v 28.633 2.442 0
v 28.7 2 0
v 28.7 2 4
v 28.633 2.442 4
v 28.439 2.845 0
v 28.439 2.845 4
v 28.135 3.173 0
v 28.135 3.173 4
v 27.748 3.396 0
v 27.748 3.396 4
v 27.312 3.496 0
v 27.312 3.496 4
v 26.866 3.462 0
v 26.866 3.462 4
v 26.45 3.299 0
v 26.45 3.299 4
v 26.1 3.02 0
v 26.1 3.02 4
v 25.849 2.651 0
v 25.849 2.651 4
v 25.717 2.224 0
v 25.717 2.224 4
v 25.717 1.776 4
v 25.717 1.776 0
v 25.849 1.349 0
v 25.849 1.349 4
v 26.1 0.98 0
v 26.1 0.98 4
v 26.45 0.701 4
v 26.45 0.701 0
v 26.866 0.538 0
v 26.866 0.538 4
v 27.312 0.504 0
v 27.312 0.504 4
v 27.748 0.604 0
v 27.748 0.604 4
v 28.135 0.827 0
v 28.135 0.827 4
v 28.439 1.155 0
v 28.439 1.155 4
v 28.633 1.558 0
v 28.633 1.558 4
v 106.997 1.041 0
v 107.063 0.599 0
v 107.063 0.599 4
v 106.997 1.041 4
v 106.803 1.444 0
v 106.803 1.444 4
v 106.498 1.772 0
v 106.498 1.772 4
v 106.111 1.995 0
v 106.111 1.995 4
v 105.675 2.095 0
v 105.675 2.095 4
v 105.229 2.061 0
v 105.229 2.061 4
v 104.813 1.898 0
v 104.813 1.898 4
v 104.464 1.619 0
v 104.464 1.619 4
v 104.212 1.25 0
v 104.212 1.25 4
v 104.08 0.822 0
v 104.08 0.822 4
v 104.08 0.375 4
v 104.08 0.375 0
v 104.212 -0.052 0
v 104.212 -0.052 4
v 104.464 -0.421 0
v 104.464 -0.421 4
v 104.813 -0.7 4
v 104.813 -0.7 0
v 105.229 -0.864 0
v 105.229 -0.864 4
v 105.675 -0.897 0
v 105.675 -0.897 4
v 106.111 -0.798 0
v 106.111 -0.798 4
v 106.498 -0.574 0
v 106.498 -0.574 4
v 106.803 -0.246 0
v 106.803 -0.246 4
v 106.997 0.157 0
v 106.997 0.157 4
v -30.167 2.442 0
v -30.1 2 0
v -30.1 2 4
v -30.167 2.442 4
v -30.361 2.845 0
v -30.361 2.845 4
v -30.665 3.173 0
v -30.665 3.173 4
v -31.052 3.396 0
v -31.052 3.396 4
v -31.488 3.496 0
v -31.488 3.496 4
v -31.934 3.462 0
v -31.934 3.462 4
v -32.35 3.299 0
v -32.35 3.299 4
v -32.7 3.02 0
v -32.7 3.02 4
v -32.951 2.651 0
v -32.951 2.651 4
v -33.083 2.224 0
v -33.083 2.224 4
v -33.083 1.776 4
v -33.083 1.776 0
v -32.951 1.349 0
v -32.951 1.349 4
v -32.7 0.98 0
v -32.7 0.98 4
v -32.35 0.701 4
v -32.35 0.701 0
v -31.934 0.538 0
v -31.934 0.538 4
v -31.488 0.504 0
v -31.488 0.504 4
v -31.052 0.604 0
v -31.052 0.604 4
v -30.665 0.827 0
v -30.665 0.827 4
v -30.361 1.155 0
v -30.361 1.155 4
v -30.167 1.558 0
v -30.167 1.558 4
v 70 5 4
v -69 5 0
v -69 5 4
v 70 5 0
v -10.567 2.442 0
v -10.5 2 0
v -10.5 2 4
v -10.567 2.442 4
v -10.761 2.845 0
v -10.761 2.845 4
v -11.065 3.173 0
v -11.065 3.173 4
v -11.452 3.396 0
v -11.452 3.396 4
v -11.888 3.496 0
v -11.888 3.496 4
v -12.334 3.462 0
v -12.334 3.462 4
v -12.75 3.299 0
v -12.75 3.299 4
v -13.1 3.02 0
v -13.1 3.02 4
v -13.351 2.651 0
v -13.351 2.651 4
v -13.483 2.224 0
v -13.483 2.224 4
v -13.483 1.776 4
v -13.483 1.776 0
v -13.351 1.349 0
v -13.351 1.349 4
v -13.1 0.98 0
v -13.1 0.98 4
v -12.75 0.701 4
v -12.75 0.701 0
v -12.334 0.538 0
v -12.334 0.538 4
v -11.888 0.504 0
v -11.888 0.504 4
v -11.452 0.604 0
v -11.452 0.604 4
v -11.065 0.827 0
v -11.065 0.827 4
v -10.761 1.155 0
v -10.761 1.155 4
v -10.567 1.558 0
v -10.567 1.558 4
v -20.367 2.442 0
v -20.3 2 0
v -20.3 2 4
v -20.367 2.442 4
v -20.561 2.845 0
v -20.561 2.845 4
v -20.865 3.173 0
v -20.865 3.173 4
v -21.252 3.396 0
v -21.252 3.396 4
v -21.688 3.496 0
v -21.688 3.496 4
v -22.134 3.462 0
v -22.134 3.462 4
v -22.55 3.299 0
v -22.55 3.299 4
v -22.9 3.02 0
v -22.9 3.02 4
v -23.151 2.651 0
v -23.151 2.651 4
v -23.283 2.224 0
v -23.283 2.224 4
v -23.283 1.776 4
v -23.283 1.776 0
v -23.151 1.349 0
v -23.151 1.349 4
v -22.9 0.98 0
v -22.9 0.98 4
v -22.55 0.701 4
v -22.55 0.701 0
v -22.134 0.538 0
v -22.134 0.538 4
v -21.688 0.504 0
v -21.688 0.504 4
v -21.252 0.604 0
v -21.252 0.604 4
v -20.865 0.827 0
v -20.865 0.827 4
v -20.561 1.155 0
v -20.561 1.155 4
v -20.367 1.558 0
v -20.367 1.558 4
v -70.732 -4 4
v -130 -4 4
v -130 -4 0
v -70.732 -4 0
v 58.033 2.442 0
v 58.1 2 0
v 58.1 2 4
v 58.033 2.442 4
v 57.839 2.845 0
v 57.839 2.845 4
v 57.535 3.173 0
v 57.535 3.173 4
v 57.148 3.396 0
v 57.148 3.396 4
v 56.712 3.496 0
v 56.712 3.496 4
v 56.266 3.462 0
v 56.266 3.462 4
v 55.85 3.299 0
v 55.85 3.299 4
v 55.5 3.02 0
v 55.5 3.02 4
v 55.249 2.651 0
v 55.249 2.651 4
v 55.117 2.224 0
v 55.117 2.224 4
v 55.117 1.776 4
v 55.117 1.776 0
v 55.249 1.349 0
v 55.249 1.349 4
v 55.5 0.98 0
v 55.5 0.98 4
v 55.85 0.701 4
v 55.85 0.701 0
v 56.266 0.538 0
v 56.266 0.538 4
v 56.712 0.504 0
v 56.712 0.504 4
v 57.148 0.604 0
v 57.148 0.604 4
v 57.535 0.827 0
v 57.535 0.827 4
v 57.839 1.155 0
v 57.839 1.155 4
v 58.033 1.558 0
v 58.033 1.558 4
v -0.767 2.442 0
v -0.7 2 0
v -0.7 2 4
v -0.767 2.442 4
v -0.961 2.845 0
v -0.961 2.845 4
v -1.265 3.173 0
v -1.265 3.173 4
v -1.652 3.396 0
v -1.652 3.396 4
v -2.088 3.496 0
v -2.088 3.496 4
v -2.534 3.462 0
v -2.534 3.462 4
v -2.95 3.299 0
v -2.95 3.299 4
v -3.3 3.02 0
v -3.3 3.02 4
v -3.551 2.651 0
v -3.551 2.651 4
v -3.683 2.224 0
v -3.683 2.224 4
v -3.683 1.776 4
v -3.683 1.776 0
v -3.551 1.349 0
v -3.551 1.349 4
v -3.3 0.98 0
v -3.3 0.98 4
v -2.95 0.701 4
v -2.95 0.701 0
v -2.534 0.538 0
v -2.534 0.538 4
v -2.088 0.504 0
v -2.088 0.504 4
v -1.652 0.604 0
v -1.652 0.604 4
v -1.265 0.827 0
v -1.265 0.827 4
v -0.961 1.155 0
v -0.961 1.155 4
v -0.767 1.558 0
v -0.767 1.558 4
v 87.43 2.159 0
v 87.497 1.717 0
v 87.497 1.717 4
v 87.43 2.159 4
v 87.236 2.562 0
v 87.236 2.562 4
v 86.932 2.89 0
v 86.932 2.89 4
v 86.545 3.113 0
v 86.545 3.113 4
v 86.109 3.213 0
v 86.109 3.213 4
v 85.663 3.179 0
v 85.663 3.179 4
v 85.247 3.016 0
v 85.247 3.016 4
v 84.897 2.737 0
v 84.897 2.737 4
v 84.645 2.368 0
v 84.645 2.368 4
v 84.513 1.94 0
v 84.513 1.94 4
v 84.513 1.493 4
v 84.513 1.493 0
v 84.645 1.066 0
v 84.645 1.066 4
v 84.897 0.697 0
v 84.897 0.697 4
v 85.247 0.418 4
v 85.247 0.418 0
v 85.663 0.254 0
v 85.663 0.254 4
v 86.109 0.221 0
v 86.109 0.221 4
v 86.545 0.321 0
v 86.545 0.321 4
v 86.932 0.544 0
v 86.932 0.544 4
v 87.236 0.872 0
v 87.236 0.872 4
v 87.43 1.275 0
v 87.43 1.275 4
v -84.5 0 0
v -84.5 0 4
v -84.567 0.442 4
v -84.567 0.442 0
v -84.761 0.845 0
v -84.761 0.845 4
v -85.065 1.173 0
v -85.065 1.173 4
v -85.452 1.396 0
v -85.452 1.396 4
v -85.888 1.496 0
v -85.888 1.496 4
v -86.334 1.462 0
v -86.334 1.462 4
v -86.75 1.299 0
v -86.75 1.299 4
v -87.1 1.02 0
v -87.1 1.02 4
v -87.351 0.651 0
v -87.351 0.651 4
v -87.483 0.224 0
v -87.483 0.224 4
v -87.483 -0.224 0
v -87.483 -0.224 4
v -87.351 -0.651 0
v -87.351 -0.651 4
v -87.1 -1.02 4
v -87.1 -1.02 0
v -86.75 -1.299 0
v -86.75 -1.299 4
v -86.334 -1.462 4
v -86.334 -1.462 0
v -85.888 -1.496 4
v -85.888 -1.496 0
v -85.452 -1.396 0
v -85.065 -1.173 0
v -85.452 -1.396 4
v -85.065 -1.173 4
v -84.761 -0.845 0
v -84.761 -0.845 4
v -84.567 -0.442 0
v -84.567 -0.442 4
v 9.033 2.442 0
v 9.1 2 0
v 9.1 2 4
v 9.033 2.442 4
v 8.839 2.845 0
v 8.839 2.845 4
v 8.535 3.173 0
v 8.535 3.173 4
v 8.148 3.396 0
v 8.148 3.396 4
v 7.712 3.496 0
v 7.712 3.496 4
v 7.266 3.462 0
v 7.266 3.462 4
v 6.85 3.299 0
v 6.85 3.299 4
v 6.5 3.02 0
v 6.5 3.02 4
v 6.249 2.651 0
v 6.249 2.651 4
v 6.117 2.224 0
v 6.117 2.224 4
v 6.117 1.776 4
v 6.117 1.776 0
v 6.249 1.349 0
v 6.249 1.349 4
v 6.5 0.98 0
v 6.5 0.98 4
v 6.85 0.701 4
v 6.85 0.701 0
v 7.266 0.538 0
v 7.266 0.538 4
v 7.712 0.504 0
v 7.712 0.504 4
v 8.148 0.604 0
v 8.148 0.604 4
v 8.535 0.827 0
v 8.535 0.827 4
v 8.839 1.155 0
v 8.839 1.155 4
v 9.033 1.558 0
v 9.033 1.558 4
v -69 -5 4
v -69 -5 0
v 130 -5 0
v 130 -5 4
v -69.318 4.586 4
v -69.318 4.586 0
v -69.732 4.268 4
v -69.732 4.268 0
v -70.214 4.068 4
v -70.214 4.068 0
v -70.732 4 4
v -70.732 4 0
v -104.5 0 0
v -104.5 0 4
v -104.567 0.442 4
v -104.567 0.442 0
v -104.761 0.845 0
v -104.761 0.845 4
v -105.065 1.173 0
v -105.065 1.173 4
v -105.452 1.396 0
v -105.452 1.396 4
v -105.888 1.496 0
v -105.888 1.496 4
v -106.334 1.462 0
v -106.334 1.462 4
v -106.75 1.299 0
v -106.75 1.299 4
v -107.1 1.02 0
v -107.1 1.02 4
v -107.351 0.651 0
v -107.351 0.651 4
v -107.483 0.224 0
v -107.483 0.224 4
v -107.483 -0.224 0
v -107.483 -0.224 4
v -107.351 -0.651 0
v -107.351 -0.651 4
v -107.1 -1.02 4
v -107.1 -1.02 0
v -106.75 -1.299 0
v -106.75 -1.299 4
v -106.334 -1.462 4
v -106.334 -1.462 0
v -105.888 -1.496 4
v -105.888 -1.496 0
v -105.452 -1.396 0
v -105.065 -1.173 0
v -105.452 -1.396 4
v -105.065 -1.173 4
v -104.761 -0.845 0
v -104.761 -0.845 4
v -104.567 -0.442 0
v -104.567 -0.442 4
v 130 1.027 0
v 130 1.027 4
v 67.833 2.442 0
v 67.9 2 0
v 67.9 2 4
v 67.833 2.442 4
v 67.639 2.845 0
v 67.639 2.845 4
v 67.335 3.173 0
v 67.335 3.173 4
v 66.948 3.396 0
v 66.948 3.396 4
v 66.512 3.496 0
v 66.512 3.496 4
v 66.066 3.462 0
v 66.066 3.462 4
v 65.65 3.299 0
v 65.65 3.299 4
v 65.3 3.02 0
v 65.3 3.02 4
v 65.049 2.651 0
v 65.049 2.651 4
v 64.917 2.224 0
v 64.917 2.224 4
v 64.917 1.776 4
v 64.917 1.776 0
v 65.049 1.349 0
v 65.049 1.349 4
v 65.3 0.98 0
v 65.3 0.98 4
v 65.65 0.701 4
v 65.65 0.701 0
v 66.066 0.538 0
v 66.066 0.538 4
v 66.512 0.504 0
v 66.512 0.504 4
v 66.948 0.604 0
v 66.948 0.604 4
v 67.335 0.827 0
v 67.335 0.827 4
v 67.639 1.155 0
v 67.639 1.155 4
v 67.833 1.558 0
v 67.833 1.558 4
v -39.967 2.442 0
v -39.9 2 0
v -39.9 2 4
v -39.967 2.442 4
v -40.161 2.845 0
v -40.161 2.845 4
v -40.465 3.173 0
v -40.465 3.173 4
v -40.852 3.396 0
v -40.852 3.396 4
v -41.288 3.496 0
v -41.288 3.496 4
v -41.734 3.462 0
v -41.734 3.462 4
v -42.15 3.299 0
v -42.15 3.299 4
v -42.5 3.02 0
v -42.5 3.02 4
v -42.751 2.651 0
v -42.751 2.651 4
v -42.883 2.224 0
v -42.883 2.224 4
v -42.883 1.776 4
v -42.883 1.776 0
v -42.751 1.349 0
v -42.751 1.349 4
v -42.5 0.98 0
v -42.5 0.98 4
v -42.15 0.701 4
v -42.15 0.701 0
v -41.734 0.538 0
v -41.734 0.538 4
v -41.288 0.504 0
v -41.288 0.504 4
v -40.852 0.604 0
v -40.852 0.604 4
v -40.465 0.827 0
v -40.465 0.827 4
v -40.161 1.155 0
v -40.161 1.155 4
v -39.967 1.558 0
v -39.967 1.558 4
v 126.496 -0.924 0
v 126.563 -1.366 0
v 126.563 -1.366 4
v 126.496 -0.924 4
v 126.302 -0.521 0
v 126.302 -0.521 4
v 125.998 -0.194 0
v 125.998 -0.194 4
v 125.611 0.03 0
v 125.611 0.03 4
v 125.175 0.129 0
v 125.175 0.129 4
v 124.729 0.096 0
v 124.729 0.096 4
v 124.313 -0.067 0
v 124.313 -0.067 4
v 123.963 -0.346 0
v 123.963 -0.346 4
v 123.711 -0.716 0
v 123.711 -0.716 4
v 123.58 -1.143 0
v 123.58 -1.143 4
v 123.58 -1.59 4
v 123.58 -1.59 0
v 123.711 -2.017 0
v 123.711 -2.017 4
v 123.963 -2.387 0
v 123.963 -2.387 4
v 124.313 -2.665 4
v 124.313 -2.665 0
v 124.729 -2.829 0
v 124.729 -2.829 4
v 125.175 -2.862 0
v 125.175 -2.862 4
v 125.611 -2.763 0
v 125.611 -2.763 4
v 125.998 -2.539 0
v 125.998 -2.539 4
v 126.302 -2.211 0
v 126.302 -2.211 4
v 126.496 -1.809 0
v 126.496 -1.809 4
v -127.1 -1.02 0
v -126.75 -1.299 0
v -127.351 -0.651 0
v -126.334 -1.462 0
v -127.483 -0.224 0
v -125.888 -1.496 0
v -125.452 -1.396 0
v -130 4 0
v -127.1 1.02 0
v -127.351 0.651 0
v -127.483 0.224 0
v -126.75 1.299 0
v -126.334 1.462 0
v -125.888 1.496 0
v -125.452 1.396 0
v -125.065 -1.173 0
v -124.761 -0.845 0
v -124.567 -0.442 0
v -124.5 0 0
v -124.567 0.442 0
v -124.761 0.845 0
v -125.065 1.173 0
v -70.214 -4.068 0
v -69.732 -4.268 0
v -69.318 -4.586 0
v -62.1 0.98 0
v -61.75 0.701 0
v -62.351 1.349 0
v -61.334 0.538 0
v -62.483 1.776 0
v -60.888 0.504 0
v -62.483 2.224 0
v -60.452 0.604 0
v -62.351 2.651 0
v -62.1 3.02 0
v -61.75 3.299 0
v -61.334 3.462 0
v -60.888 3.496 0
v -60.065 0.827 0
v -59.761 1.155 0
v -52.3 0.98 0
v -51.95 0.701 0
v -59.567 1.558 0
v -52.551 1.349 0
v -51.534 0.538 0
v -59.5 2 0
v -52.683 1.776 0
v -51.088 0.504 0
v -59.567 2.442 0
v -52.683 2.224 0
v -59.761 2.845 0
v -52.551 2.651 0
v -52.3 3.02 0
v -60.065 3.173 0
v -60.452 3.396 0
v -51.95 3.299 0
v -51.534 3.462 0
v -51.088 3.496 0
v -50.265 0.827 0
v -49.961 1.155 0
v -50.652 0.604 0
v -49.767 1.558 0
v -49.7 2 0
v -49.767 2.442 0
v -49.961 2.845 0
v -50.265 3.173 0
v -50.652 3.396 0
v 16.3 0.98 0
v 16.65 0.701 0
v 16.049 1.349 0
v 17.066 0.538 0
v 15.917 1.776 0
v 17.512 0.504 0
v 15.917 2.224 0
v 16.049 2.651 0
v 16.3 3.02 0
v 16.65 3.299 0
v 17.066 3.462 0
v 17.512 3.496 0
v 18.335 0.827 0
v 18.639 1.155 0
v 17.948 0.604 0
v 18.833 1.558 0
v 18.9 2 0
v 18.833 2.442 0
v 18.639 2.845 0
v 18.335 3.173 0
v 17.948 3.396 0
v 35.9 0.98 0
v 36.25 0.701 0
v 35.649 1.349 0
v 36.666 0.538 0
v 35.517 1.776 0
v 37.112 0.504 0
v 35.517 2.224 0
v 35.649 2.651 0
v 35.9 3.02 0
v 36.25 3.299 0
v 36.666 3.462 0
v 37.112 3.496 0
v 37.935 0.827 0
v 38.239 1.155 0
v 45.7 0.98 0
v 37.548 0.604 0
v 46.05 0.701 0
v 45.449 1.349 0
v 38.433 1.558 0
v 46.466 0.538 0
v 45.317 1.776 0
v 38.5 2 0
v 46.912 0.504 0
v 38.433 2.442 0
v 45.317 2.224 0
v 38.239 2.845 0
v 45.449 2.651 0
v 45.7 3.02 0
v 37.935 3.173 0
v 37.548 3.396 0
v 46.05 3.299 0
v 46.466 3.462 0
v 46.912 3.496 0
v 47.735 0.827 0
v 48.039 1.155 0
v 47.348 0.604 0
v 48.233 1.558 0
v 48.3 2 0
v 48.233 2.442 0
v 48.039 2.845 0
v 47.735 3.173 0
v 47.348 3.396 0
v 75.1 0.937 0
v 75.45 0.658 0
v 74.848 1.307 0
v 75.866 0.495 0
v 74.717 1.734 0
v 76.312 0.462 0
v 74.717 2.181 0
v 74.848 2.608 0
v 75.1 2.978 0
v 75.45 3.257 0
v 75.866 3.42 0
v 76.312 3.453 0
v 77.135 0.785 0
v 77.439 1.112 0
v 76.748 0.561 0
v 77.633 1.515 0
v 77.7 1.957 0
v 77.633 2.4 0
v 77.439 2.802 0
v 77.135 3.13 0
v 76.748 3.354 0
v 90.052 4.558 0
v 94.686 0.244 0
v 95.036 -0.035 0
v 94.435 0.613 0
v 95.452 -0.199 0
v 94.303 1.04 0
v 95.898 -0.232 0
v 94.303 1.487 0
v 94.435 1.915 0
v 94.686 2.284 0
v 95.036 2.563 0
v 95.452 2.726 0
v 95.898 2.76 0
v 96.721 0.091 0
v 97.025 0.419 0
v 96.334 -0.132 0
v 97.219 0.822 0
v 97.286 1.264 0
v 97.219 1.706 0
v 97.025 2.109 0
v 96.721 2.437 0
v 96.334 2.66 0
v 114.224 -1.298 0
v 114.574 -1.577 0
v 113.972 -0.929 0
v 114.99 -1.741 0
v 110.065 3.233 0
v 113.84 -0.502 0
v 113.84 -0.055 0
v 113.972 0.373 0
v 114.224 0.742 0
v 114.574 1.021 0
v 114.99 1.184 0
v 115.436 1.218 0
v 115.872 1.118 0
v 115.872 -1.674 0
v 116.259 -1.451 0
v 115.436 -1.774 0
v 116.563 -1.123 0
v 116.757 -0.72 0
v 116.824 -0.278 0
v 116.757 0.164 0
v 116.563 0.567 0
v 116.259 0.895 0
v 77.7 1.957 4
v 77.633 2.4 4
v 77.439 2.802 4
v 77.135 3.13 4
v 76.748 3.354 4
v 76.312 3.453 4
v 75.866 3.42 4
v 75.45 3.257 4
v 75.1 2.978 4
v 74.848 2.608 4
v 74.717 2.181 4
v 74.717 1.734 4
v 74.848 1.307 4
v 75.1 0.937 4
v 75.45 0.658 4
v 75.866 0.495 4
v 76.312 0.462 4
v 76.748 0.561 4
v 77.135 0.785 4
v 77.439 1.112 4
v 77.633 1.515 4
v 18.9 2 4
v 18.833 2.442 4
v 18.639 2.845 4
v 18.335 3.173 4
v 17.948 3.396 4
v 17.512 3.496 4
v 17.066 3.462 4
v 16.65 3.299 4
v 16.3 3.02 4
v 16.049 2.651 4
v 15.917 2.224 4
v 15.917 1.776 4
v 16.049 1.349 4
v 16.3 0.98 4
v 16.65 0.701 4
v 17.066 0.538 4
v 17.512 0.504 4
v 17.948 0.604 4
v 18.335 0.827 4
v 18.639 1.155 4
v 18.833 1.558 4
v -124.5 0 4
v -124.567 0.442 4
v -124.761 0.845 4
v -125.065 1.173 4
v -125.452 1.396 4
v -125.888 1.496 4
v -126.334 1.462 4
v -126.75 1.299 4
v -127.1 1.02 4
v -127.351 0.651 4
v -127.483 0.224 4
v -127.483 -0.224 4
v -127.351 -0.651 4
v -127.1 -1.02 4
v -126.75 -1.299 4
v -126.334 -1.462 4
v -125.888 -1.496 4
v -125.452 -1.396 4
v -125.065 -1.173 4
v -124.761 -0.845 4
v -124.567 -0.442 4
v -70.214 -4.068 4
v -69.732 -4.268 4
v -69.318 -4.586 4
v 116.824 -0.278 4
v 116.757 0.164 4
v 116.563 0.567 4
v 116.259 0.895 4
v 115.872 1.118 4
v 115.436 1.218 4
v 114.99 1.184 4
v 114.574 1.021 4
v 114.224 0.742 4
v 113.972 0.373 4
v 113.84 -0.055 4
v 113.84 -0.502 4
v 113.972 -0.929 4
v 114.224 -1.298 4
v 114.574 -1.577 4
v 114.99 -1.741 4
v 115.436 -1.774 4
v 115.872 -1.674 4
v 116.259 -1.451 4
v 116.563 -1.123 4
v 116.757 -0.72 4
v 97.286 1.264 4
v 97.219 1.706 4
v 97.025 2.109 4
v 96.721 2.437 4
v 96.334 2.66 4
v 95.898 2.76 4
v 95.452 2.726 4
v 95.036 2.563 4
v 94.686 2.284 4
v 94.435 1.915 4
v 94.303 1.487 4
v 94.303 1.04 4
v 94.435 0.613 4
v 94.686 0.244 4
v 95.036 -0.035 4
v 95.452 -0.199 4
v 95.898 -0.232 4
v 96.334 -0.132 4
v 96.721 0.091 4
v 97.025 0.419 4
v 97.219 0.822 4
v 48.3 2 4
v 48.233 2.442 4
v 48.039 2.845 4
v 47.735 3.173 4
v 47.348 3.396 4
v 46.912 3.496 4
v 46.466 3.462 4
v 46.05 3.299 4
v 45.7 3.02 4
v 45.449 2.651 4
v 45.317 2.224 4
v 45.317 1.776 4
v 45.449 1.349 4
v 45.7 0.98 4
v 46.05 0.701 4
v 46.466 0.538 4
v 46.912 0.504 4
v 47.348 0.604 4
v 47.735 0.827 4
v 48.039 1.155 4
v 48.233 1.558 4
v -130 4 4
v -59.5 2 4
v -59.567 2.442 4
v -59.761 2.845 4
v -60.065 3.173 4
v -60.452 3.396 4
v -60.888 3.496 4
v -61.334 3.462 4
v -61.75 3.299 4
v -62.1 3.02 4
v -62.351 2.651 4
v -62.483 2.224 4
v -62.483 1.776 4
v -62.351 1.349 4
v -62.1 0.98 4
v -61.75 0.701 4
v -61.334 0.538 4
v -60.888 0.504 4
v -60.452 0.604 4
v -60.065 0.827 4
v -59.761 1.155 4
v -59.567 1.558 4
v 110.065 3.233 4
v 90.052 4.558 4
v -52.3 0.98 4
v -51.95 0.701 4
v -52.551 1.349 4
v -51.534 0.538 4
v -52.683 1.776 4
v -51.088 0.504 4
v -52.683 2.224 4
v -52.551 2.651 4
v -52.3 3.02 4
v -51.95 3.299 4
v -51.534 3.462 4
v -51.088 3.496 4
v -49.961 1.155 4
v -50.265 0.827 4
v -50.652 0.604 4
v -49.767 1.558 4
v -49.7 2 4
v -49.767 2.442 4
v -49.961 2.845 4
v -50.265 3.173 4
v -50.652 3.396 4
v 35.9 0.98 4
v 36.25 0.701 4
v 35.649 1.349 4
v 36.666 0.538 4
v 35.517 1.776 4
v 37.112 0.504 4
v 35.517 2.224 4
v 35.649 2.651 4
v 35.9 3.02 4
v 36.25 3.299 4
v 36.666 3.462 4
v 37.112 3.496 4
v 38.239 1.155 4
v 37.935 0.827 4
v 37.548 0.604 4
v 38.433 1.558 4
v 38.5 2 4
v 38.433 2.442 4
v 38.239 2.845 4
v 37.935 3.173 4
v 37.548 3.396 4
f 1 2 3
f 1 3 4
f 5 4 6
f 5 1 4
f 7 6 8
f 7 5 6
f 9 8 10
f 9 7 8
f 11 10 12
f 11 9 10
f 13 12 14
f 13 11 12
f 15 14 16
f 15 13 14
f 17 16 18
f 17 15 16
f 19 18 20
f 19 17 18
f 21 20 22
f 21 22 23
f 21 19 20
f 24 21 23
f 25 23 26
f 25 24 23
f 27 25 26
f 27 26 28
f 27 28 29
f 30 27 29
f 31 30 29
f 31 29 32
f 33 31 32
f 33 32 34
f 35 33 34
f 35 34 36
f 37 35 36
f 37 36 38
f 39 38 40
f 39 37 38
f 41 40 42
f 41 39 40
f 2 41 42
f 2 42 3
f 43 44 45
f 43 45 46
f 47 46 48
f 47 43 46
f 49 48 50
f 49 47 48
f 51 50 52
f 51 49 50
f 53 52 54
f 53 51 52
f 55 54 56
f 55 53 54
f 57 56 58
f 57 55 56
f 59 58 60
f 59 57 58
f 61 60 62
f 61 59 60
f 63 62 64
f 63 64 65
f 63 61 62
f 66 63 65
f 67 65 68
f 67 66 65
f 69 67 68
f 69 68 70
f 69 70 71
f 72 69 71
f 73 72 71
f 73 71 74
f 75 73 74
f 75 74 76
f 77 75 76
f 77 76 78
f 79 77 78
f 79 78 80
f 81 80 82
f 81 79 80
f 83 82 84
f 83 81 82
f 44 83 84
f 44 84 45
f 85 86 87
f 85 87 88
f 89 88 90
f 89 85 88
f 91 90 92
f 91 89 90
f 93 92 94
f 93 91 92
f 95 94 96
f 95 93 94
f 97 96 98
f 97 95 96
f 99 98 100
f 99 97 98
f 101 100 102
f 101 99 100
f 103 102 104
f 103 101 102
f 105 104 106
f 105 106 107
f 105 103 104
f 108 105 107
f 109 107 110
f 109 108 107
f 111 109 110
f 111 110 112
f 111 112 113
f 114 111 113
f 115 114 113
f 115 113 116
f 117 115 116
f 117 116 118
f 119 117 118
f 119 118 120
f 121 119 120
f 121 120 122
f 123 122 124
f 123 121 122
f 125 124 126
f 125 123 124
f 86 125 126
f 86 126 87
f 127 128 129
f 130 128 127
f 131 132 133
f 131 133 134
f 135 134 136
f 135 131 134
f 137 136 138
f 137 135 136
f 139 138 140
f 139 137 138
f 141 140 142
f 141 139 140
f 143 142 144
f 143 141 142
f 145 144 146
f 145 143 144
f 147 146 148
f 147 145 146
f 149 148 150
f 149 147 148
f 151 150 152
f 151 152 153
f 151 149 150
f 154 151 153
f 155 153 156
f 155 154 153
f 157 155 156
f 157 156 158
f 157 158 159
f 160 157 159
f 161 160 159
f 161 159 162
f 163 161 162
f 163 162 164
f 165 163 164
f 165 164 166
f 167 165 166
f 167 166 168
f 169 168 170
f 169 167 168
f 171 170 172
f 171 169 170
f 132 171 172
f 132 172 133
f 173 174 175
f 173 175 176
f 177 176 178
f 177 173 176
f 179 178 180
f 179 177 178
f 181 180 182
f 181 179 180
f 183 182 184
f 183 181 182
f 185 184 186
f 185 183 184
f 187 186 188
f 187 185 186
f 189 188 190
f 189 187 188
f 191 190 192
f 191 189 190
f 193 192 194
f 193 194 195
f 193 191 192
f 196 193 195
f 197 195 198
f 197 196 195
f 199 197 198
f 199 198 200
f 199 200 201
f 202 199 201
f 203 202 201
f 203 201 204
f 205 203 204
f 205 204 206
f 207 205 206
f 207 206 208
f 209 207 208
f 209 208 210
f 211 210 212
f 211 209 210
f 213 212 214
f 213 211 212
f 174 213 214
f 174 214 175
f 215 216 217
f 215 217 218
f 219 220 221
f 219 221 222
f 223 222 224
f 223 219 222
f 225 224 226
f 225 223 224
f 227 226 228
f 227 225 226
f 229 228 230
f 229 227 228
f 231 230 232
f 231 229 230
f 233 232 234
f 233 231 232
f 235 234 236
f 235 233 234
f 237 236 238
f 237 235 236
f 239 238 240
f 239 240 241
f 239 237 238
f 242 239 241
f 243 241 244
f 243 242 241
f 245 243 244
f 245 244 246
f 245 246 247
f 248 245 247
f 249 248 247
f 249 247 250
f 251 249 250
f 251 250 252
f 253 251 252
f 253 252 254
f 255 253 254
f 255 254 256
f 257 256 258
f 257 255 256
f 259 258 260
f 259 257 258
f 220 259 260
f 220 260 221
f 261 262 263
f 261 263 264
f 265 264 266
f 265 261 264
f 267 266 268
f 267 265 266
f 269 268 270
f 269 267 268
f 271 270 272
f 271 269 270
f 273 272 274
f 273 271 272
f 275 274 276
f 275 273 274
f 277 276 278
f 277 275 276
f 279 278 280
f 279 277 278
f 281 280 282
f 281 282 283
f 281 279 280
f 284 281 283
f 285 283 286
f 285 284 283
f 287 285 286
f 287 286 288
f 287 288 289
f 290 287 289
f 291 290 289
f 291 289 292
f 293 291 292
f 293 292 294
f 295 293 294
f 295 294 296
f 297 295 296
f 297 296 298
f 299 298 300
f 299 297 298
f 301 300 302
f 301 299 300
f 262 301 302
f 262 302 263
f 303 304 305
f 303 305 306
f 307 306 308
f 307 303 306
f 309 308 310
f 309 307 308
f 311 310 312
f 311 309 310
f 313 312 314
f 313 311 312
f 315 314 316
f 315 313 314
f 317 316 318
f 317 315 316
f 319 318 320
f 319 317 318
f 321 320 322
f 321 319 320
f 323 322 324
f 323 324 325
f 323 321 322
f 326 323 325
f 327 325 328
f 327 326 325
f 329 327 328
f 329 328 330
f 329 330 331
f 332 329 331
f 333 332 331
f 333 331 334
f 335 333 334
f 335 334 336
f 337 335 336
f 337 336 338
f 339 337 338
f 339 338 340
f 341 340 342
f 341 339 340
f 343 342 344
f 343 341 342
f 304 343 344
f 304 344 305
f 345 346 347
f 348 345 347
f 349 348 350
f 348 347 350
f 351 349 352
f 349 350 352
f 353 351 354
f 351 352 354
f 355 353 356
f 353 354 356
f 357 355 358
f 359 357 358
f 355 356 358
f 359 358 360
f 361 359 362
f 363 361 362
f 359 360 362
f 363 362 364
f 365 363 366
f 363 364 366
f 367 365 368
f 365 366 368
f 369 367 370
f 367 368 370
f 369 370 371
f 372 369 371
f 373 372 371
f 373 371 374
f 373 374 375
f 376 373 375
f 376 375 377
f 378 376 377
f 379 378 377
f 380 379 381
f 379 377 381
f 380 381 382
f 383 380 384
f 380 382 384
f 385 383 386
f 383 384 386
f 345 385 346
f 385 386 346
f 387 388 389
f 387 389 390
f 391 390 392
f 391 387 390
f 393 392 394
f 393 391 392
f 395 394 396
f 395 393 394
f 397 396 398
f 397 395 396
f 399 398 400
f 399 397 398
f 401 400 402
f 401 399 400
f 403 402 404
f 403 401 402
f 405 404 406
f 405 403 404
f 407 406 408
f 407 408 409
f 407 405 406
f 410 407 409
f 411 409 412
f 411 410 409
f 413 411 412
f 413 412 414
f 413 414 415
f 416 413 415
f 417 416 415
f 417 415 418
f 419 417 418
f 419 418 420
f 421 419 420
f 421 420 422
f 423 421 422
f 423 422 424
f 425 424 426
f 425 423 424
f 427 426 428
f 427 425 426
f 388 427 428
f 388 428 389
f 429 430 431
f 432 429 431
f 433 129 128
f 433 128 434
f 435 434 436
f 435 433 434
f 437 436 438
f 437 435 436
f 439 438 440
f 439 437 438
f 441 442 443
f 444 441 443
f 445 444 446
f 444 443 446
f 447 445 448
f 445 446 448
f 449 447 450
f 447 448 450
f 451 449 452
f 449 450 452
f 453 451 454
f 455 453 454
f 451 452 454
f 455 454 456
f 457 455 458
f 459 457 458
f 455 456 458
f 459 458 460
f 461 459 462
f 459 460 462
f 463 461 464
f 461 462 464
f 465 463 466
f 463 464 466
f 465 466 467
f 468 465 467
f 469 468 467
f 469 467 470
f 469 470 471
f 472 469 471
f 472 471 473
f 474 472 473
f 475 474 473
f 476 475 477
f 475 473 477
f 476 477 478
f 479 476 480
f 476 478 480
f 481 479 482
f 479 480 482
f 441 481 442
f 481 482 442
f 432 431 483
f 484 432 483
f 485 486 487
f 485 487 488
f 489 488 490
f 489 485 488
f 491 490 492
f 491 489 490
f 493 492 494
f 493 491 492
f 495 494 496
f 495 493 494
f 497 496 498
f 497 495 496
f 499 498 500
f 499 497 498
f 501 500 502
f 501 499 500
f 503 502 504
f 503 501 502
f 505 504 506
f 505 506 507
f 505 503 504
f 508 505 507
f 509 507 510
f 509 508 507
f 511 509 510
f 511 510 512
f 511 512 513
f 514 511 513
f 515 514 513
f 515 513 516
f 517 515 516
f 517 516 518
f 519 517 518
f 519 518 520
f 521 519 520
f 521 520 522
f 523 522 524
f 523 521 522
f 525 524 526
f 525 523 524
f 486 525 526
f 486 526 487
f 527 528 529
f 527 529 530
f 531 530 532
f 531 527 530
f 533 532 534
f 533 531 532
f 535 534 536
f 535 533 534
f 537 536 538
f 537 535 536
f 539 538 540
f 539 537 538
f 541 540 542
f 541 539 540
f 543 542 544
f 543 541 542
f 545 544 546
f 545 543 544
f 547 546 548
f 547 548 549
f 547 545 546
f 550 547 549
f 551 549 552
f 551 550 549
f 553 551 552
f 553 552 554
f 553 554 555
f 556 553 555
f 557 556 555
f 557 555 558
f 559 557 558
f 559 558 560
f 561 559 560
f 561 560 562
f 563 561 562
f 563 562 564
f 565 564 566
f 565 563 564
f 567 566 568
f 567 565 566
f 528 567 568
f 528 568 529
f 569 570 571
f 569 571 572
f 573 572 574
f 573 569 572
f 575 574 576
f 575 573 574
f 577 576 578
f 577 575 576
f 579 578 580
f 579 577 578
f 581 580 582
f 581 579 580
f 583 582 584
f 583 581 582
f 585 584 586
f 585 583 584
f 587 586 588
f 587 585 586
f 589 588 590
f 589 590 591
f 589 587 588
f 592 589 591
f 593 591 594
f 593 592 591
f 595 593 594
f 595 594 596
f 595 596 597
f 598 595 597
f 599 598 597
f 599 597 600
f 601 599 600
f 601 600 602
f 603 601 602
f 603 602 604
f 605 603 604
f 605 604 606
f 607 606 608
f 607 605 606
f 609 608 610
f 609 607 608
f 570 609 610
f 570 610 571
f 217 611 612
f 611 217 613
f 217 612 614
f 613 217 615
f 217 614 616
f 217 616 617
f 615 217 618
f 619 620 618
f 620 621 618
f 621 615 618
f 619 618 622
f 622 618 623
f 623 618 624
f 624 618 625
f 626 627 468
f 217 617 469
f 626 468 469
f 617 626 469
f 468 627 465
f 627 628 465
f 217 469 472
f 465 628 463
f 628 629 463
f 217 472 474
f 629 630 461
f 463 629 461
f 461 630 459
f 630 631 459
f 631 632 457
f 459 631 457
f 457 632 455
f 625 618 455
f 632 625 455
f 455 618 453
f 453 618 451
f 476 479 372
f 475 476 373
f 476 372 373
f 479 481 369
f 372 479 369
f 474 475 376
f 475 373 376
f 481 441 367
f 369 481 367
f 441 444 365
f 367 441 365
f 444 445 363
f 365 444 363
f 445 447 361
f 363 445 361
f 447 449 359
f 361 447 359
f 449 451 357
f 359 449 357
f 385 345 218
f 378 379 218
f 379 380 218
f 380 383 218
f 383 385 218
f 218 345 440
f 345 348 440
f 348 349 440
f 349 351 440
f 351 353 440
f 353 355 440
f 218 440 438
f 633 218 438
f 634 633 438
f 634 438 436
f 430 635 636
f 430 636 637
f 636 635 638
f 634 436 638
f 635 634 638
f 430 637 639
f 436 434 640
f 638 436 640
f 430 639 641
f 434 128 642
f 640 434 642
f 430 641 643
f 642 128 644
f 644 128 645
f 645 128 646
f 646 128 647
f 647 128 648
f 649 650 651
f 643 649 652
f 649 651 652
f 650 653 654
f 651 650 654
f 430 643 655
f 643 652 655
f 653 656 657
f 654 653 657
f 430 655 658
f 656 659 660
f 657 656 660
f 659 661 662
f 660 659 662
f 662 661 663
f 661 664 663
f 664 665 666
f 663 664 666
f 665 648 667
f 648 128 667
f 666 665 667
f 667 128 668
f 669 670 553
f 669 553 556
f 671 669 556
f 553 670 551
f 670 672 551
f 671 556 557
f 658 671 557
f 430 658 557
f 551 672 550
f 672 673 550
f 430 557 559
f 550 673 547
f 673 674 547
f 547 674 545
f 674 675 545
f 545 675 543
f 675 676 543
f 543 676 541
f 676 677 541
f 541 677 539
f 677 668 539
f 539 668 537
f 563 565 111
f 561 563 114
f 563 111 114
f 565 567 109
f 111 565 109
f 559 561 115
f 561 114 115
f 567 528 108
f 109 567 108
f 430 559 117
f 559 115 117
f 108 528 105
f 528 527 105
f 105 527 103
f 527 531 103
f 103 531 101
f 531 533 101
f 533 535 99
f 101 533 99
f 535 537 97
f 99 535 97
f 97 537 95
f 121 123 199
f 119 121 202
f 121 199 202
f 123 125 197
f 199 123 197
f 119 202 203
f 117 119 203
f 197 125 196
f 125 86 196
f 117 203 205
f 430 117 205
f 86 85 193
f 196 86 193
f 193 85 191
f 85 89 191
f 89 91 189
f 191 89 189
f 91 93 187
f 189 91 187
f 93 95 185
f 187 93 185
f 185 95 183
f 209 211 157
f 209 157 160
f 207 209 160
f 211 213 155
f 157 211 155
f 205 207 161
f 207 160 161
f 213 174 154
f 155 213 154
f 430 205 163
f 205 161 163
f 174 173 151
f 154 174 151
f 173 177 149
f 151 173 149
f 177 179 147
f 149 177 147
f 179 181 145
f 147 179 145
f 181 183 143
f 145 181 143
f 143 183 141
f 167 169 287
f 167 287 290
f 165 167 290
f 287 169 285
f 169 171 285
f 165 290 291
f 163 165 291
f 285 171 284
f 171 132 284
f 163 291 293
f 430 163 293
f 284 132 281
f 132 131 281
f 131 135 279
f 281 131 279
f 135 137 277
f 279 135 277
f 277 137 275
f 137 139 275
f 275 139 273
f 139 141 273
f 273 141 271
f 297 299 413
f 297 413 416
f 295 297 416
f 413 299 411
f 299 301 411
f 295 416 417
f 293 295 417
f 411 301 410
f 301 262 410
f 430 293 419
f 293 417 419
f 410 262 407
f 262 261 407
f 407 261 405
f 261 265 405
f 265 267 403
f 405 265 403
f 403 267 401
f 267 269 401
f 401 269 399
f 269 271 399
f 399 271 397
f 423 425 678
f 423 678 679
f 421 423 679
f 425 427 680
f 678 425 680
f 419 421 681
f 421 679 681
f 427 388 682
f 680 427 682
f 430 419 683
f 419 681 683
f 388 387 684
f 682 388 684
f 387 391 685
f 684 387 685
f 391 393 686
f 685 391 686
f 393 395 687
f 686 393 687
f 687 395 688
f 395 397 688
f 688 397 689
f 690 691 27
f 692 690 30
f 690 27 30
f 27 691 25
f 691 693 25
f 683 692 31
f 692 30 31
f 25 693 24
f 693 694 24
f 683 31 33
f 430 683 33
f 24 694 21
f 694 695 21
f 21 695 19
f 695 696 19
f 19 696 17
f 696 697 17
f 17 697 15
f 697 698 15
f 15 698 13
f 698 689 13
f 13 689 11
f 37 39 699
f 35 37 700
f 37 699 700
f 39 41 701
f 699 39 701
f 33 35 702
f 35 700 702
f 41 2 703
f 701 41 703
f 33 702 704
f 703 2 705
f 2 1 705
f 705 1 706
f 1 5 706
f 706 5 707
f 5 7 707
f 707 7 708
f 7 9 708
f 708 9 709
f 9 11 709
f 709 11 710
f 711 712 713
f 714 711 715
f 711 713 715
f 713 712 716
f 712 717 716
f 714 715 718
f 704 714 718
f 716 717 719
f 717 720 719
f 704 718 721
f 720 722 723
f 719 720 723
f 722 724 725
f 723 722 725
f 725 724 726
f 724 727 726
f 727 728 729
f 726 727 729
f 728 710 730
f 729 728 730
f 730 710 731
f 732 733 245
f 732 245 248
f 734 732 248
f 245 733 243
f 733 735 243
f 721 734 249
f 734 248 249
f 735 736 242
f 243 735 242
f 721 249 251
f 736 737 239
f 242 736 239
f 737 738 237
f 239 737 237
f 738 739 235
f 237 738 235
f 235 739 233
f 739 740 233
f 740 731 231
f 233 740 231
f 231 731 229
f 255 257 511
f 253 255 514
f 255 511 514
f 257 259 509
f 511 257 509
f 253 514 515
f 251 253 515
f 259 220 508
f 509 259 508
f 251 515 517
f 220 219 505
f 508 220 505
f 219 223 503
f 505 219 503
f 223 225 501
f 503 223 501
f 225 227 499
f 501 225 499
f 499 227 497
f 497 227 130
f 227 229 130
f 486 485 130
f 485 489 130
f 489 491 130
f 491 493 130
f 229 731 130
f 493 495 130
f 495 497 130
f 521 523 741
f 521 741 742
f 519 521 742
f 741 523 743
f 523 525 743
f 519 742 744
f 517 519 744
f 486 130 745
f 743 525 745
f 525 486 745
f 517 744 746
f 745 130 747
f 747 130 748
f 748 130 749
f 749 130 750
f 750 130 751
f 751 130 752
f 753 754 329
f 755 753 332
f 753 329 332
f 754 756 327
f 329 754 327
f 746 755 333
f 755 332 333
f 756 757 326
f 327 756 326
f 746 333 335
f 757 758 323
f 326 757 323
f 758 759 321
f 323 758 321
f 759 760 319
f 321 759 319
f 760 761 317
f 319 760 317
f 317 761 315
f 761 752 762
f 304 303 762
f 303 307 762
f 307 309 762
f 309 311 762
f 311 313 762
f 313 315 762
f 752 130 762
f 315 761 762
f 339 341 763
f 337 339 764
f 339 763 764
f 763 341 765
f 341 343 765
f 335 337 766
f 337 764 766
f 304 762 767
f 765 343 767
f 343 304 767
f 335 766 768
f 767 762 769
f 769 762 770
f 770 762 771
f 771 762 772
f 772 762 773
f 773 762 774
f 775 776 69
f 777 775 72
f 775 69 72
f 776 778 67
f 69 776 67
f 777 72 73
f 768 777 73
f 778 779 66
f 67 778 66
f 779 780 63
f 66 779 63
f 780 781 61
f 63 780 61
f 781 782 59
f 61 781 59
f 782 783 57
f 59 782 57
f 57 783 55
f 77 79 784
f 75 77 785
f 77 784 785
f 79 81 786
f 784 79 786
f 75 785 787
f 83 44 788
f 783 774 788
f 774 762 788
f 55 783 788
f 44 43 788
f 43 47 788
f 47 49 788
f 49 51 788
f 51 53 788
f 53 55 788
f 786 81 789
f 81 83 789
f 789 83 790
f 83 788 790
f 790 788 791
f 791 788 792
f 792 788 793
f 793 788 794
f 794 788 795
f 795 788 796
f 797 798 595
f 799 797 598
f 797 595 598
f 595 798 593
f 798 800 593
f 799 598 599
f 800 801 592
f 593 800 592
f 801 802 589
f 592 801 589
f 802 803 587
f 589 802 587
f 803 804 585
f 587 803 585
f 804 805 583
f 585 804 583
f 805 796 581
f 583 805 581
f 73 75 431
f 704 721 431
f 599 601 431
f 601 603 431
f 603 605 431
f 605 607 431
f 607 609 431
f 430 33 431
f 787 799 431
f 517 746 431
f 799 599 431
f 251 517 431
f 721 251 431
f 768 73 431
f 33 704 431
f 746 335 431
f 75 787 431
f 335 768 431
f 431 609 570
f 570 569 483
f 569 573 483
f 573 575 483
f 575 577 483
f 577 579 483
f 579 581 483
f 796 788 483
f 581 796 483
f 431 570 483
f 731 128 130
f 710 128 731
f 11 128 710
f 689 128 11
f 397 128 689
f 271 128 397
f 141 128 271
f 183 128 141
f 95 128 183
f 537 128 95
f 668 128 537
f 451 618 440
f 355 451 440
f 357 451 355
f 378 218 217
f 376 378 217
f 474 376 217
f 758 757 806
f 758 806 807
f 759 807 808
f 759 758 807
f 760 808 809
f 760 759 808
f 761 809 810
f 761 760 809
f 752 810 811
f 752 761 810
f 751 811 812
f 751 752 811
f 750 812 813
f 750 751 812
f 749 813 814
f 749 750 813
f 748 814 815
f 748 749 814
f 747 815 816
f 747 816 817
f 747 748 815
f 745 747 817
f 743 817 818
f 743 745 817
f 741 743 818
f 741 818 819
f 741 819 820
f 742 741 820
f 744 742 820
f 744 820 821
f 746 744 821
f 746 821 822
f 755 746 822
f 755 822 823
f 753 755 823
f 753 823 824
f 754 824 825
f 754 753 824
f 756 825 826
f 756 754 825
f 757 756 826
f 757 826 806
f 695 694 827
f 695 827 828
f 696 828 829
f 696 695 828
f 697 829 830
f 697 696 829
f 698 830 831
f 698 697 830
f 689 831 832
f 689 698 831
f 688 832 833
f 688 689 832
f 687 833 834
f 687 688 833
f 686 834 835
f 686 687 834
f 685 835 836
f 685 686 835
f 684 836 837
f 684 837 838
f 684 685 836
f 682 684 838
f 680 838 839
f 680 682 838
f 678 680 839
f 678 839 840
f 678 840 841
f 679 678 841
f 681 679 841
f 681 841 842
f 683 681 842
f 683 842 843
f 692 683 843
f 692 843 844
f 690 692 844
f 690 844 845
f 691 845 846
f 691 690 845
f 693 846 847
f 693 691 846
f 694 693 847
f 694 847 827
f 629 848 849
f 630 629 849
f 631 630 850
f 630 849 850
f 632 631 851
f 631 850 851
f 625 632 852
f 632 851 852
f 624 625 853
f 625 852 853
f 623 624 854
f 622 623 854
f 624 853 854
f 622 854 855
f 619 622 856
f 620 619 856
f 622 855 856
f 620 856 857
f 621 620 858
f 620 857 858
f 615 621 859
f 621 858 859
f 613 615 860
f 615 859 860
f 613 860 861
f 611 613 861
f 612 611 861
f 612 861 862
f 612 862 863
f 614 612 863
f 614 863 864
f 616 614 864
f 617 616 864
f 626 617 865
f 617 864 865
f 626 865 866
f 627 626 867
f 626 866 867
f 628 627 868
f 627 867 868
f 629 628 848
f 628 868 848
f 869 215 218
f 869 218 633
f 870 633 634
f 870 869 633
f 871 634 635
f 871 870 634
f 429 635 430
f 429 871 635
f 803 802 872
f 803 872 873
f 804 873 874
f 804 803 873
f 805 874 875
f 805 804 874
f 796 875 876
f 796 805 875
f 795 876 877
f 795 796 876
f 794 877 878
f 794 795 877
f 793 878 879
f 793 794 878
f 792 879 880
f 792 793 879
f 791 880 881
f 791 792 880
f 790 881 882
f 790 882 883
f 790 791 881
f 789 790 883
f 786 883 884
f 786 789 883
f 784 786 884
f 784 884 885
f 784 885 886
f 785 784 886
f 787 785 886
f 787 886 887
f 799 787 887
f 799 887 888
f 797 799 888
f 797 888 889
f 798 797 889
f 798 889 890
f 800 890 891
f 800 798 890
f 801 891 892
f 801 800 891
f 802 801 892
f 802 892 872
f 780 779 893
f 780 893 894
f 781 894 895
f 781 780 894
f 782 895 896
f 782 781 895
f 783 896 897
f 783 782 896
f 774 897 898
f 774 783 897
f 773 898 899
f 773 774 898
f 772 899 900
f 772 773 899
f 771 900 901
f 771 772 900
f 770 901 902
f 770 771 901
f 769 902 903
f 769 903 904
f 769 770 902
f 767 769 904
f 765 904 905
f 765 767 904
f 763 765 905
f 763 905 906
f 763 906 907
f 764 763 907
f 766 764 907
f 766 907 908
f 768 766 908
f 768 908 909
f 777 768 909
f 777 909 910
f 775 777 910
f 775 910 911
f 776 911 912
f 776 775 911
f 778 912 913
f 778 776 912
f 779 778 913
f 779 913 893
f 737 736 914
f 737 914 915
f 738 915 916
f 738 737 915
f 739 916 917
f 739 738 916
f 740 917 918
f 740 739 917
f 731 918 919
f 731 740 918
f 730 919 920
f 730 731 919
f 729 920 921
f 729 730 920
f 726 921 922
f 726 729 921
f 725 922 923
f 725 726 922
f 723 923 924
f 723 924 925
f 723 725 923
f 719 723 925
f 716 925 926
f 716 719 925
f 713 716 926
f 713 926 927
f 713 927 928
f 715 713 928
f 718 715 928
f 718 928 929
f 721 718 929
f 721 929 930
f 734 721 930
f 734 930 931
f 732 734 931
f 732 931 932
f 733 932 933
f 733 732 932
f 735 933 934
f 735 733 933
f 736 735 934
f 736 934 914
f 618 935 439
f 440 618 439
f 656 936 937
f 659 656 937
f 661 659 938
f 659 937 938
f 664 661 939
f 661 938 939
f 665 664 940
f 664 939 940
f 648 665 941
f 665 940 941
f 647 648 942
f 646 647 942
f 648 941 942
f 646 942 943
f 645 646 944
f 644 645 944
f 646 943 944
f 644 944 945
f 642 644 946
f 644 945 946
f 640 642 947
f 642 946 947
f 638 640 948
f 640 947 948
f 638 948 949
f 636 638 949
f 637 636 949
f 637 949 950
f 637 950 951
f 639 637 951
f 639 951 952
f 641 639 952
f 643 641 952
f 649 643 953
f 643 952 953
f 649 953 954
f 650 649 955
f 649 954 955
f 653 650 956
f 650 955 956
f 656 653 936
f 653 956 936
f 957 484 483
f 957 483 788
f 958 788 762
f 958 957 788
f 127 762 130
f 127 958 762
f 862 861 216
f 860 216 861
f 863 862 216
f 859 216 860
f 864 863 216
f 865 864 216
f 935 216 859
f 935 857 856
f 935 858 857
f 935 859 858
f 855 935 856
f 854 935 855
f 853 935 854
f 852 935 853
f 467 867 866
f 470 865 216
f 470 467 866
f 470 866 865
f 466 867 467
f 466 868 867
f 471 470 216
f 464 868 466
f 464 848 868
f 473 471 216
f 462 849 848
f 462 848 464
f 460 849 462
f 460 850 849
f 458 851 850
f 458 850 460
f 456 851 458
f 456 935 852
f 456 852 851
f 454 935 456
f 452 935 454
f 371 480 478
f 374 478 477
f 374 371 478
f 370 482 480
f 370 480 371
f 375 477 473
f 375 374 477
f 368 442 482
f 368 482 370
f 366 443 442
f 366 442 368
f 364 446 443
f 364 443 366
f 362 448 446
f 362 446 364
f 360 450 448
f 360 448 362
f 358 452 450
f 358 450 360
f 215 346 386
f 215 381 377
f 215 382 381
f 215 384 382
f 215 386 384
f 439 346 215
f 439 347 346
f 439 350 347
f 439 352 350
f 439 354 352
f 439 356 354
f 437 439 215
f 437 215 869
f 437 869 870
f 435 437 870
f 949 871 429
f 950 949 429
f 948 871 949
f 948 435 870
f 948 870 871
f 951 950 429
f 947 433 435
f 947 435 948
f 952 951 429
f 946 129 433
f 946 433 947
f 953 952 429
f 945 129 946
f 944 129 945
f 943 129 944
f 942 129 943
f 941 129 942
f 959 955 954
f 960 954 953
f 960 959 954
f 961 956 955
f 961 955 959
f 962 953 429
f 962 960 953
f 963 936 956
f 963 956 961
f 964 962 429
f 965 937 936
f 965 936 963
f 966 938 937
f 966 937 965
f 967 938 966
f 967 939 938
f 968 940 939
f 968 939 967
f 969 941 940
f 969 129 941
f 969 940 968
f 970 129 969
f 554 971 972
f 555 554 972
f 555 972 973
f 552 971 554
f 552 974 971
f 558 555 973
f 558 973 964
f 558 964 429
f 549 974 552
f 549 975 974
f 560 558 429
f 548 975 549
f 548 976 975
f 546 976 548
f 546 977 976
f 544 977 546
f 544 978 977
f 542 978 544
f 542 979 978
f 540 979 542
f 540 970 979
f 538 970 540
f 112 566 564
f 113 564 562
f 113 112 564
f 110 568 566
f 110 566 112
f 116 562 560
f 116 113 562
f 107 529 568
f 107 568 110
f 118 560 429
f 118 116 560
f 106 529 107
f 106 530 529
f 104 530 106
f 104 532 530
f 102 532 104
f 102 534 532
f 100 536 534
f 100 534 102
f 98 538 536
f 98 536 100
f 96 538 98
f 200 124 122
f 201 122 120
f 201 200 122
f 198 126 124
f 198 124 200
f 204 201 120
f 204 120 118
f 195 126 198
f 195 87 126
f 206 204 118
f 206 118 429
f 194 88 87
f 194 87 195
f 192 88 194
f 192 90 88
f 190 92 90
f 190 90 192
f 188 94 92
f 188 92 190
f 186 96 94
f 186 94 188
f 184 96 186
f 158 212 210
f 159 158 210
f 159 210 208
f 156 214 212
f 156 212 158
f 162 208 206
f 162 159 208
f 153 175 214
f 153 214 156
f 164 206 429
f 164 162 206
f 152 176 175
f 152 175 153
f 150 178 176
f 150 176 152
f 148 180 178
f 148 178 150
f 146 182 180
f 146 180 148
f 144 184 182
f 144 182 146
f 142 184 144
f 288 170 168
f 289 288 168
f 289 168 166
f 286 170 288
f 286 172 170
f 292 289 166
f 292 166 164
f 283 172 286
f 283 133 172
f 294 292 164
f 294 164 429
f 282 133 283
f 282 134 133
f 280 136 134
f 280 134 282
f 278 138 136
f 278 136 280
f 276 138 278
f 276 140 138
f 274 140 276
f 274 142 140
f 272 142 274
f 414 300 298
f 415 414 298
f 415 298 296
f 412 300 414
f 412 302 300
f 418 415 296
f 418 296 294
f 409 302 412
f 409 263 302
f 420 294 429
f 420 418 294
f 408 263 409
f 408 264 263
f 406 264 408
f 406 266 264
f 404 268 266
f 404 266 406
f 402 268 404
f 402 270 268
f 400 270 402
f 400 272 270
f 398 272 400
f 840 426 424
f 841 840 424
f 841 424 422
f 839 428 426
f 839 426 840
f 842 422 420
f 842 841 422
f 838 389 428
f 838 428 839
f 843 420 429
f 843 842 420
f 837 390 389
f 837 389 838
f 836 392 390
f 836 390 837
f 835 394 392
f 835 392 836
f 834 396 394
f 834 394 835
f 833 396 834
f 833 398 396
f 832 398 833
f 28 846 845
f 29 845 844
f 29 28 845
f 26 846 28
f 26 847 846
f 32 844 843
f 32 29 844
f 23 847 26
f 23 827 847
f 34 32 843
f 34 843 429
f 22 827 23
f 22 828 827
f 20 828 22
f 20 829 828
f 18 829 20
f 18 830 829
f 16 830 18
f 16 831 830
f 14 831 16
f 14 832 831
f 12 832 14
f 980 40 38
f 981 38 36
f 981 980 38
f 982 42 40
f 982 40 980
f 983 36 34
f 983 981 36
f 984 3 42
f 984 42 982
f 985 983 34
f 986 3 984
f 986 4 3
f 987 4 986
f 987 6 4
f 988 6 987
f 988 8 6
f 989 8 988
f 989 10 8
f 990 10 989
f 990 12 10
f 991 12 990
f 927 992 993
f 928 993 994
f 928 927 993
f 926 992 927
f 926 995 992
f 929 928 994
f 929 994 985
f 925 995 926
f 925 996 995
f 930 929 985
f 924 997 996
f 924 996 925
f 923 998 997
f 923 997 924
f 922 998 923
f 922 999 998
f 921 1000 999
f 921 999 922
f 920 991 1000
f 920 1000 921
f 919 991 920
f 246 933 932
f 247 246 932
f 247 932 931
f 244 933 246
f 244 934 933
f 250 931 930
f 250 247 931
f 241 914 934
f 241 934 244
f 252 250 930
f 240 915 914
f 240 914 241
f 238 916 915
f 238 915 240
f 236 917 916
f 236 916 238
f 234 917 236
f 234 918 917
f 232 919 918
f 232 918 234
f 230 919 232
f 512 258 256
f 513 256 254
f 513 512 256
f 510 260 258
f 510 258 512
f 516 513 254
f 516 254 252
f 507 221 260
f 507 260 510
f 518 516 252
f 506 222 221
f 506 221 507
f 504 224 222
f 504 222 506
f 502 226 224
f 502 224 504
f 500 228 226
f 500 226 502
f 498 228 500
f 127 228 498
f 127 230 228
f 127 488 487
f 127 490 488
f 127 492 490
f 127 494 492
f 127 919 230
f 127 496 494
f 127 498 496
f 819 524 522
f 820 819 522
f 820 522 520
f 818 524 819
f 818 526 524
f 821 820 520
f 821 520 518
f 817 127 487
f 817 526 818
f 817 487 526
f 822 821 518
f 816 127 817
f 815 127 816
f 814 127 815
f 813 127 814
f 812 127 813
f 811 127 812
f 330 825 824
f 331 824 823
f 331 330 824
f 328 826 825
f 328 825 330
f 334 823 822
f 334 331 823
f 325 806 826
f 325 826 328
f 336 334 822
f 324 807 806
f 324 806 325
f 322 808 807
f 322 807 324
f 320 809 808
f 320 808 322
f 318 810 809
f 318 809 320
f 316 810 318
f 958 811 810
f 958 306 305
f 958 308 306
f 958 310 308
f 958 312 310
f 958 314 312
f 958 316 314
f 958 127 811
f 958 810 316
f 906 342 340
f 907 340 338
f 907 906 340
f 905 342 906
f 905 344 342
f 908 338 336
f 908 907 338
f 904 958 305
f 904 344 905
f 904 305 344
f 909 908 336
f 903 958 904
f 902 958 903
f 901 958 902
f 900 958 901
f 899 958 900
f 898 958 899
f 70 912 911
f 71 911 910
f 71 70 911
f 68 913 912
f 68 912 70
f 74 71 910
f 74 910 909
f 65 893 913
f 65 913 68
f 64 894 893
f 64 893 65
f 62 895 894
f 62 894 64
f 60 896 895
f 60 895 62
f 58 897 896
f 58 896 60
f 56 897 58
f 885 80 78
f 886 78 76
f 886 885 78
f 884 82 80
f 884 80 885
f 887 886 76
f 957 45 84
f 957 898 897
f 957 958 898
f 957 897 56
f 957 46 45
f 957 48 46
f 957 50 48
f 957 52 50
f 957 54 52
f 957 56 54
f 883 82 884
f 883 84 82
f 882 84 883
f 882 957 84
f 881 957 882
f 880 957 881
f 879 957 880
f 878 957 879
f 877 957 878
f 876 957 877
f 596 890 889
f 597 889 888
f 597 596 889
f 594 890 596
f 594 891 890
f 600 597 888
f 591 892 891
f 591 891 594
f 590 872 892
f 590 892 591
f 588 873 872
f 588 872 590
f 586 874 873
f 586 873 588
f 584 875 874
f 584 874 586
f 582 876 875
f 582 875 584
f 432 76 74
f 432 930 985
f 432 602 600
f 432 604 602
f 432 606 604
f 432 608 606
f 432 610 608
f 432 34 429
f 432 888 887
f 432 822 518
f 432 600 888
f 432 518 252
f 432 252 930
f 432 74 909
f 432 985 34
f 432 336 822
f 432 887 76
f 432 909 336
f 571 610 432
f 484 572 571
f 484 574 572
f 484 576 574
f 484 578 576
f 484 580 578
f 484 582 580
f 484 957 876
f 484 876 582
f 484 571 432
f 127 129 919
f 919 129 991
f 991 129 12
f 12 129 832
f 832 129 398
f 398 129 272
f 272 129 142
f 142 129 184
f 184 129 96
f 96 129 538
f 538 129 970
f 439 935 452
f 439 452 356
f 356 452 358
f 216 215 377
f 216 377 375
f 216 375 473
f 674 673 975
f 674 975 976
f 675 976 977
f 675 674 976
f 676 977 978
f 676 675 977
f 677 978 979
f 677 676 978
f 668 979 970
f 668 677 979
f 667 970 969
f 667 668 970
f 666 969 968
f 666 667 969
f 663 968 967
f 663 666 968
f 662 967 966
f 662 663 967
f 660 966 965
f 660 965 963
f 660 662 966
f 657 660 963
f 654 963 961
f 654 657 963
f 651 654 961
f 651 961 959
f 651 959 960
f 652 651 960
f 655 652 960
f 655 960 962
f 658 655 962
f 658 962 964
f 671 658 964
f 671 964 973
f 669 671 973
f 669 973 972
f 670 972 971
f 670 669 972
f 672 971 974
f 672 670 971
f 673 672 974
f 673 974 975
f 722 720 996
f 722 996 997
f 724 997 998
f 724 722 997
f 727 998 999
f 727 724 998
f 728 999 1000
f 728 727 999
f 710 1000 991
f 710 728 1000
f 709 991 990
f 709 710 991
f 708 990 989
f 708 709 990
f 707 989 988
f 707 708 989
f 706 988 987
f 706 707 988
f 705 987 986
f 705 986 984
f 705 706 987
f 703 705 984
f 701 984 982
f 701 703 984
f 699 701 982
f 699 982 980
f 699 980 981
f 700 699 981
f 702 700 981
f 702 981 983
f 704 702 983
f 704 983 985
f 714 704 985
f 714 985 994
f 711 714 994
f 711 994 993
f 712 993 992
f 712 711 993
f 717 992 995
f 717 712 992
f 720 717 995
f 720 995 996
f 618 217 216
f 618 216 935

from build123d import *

# Parameters (mm, degrees)
SKETCH_1_W                = 260
SKETCH_1_H                = 10
EXTRUDE_1_DEPTH           = 4
SKETCH_2_W                = 122
SKETCH_2_H                = 2
CUT_EXTRUDE_1_DEPTH       = 4
SKETCH_4_R                = 1.5
CUT_EXTRUDE_2_DEPTH       = 4
FILLET_1_R                = 2
SKETCH_7_R                = 1.5
CUT_EXTRUDE_3_DEPTH       = 4
PATTERN_CURVE_1_OUTLINE_R = 1.5
PATTERN_CURVE_1_DEPTH     = 4
CUT_EXTRUDE_4_DEPTH       = 4


# Read off the part's stored shape, not the designer's step: 曲线阵列1
with BuildPart() as part:
    # 草图1 → 凸台-拉伸1 (new body)
    with BuildSketch(Plane.XY):
        Rectangle(SKETCH_1_W, SKETCH_1_H)
    extrude(amount=EXTRUDE_1_DEPTH)

    # 草图2 → 切除-拉伸1 (cut)
    with BuildSketch(Plane.XY.offset(4)):
        with Locations((-130, 5)):
            Rectangle(SKETCH_2_W, SKETCH_2_H)
    cut_extrude_1 = extrude(amount=-CUT_EXTRUDE_1_DEPTH, mode=Mode.SUBTRACT)

    # 镜向1: 切除-拉伸1 across plane
    add(cut_extrude_1.mirror(Plane.ZX), mode=Mode.SUBTRACT)

    # 草图4 → 切除-拉伸2 (cut)
    with BuildSketch(Plane.XY.offset(4)):
        with Locations((-126, 0)):
            Circle(SKETCH_4_R)
        with Locations((-86, 0)):
            Circle(SKETCH_4_R)
        with Locations((-106, 0)):
            Circle(SKETCH_4_R)
    extrude(amount=-CUT_EXTRUDE_2_DEPTH, mode=Mode.SUBTRACT)

    # 圆角1
    # the kernel refuses this fillet: 2 mm, written as the material it adds along each edge
    with BuildSketch(Plane(origin=(-69, -4, 4), x_dir=(0, -1, 0), z_dir=(0, 0, -1))) as fillet_1_piece_1:
        with BuildLine():
            CenterArc((2, 1.732050808), FILLET_1_R, 180, 60)
            Line((0, 1.732050808), (-0.04, 1.732050808))
            Line((-0.04, 1.732050808), (-0.04, 0))
            Line((-0.04, 0), (0, -0.04))
            ThreePointArc((0, -0.04), (0.5, -0.04), (0.98, -0.034641016))
            Line((0.98, -0.034641016), (1, 0))
        make_face()
    extrude(amount=4)
    with BuildSketch(Plane(origin=(-69, 4, 4), x_dir=(-1, 0, 0), z_dir=(0, 0, -1))) as fillet_1_piece_2:
        with BuildLine():
            CenterArc((1.732050808, 2), FILLET_1_R, 210, 60)
            Line((0, 1), (-0.034641016, 0.98))
            ThreePointArc((-0.034641016, 0.98), (-0.04, 0.5), (-0.04, 0))
            Line((-0.04, 0), (0, -0.04))
            Line((0, -0.04), (1.732050808, -0.04))
            Line((1.732050808, -0.04), (1.732050808, 0))
        make_face()
    extrude(amount=4)

    # 草图7 → 切除-拉伸3 (cut)
    with BuildSketch(Plane.XY.offset(4)):
        with Locations((-61, 2)):
            Circle(SKETCH_7_R)
    extrude(amount=-CUT_EXTRUDE_3_DEPTH, mode=Mode.SUBTRACT)

    # 曲线阵列1 outline → 曲线阵列1 (cut)
    with BuildSketch(Plane.XY):
        with Locations((125.062891226, -1.366432364)):
            Circle(PATTERN_CURVE_1_OUTLINE_R)
        with Locations((115.323700734, -0.278128004)):
            Circle(PATTERN_CURVE_1_OUTLINE_R)
        with Locations((105.563205139, 0.598777673)):
            Circle(PATTERN_CURVE_1_OUTLINE_R)
        with Locations((95.785992512, 1.263872463)):
            Circle(PATTERN_CURVE_1_OUTLINE_R)
        with Locations((85.996658783, 1.716843728)):
            Circle(PATTERN_CURVE_1_OUTLINE_R)
        with Locations((76.199805579, 1.957478543)):
            Circle(PATTERN_CURVE_1_OUTLINE_R)
        with Locations((66.4, 2)):
            Circle(PATTERN_CURVE_1_OUTLINE_R)
        with Locations((56.6, 2)):
            Circle(PATTERN_CURVE_1_OUTLINE_R)
        with Locations((46.8, 2)):
            Circle(PATTERN_CURVE_1_OUTLINE_R)
        with Locations((37, 2)):
            Circle(PATTERN_CURVE_1_OUTLINE_R)
        with Locations((27.2, 2)):
            Circle(PATTERN_CURVE_1_OUTLINE_R)
        with Locations((17.4, 2)):
            Circle(PATTERN_CURVE_1_OUTLINE_R)
        with Locations((7.6, 2)):
            Circle(PATTERN_CURVE_1_OUTLINE_R)
        with Locations((-2.2, 2)):
            Circle(PATTERN_CURVE_1_OUTLINE_R)
        with Locations((-12, 2)):
            Circle(PATTERN_CURVE_1_OUTLINE_R)
        with Locations((-21.8, 2)):
            Circle(PATTERN_CURVE_1_OUTLINE_R)
        with Locations((-31.6, 2)):
            Circle(PATTERN_CURVE_1_OUTLINE_R)
        with Locations((-41.4, 2)):
            Circle(PATTERN_CURVE_1_OUTLINE_R)
        with Locations((-51.2, 2)):
            Circle(PATTERN_CURVE_1_OUTLINE_R)
    extrude(amount=PATTERN_CURVE_1_DEPTH, mode=Mode.SUBTRACT)

    # 草图8 → 切除-拉伸4 (cut)
    with BuildSketch(Plane.XY.offset(4)):
        with BuildLine():
            Line((70, 5), (130, 5))
            Line((130, 5), (130.398230088, 0.973451327))
            ThreePointArc((130.398230088, 0.973451327), (100.266149788, 3.992246825), (70, 5))
        make_face()
    extrude(amount=-CUT_EXTRUDE_4_DEPTH, mode=Mode.SUBTRACT)


solid = part.part
